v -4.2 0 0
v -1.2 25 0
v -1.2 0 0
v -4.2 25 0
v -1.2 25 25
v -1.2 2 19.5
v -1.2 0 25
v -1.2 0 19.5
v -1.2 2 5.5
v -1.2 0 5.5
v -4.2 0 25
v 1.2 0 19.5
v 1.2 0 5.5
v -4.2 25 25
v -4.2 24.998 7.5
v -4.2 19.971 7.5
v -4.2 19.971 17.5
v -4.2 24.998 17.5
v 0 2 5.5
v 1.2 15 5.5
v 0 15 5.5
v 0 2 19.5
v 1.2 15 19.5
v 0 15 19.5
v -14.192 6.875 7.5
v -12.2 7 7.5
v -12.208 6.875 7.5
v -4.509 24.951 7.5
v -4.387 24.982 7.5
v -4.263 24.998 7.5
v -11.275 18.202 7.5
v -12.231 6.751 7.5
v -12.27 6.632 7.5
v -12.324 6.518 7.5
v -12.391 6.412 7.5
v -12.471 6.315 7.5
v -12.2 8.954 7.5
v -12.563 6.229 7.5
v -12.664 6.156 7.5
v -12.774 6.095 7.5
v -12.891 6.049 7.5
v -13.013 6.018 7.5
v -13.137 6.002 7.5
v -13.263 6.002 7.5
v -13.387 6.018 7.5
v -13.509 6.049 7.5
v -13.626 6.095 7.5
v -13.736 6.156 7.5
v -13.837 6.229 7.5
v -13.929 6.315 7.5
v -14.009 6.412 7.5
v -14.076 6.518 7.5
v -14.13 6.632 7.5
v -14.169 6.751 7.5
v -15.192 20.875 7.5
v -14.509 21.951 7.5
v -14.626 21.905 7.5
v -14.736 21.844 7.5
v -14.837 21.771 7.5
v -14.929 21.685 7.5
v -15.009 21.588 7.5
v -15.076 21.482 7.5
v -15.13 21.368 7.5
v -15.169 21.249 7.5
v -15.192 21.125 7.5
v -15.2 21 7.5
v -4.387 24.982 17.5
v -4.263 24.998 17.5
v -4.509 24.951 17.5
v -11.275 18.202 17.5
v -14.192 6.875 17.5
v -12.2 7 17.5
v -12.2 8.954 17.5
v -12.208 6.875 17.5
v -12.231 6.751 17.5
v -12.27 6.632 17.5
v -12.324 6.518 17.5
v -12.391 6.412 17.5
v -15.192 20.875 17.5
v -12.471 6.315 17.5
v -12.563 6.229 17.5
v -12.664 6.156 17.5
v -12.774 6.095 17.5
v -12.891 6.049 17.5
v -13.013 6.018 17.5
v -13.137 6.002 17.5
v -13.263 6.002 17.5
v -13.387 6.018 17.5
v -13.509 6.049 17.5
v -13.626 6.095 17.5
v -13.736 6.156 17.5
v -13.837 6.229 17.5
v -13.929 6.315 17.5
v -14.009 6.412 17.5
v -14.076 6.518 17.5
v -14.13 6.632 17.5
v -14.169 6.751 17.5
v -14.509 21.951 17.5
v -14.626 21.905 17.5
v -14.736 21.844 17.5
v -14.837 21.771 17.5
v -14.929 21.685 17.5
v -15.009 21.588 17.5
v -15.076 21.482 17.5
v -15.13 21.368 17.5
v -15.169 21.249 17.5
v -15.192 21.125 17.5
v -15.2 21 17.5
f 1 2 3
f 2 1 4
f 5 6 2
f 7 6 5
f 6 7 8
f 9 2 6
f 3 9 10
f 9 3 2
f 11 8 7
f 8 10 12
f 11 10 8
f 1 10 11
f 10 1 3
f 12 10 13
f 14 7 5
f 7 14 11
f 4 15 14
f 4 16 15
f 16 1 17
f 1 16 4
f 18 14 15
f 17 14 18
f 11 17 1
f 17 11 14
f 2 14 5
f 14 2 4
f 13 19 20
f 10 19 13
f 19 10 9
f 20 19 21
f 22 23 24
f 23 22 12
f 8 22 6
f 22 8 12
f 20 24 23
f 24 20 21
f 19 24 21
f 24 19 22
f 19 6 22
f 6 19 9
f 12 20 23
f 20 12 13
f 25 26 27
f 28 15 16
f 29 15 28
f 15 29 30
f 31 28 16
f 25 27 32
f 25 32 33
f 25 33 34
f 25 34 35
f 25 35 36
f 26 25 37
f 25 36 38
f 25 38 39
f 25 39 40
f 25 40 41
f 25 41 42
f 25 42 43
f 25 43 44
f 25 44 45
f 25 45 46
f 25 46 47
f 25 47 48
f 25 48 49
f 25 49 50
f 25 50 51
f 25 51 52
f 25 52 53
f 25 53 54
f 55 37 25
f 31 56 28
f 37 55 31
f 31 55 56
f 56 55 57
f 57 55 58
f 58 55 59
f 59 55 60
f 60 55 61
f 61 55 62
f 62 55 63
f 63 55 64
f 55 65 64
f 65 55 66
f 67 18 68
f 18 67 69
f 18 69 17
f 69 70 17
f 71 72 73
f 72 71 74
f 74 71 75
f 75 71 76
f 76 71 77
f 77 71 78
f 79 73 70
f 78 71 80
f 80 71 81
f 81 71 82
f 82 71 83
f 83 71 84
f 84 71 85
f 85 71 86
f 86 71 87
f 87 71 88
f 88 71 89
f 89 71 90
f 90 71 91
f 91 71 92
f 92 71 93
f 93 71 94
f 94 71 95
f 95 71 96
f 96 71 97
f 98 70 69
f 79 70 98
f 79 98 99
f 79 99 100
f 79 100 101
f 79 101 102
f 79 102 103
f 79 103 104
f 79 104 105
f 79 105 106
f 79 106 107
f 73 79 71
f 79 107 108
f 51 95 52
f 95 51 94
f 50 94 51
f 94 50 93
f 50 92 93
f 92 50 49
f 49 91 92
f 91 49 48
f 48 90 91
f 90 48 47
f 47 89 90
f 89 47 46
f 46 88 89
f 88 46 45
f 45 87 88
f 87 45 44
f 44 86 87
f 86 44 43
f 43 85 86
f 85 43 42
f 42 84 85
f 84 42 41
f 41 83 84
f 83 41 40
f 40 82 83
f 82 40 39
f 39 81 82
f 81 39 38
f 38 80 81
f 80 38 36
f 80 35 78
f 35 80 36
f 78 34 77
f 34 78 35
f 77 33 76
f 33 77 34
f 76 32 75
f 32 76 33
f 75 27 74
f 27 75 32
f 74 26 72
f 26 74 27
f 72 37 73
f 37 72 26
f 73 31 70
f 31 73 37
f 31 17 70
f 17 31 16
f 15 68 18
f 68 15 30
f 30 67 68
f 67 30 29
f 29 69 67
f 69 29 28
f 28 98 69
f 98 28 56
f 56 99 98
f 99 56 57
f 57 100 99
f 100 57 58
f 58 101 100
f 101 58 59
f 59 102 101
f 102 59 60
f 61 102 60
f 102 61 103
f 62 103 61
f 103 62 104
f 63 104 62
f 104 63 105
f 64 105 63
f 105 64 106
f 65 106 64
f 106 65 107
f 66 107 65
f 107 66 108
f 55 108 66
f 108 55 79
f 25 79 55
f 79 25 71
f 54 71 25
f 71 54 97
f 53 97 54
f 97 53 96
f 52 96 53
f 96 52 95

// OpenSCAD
metal_thickness         = 1.2; //thickness of the sheet metal
slot_depth              = 1.2;
clip_length             = 15;
clip_width              = 14;
mountingplate_width     = 25;
mountingplate_thickness = 3;
mountingplate_height    = 25;
hook_width              = 10;
hook_type               = "single"; //"single" = ohne hook, "double" = two hooks in a row
round_edge_radius       = 1;
$fn                     = 50;
hook_data               = [[0,0],[10,3],[9,17],[9,15],[8,5],[0,3]];
custom_support          = false; //true = print a custom support structure for the clip. false = print no support.



//the mounting plate:
linear_extrude( mountingplate_width )
	translate([-metal_thickness-mountingplate_thickness,0,0])
		polygon( points=[[0,0],[0,mountingplate_height],[mountingplate_thickness,mountingplate_height],[mountingplate_thickness,0]] );


//the clip for the slot:
translate([0,0,(mountingplate_width-clip_width)/2])
	linear_extrude( clip_width )
		polygon( points=[[0,0],[0,clip_length],[slot_depth,clip_length],[slot_depth,0],[metal_thickness-mountingplate_thickness,0],[metal_thickness-mountingplate_thickness,2],[0,2]] );


//support structure for the clip (because cura does not handle the clip at all, and slic3r does not handle it to my complete satisfaction):
if ( custom_support )
{
	for(x = [0.5 : 1.0 : clip_length])
		translate([0.5,x,(mountingplate_width-clip_width)/2-2.8])
			rotate([90,0,0])
				linear_extrude( 0.5 )
					square([1.6,(mountingplate_width-clip_width)/2], center=true);
	translate([-0.8,1,(mountingplate_width-clip_width)/2-2.8])
		rotate([90,0,90])
			linear_extrude( 0.5 )
				square([2.5,(mountingplate_width-clip_width)/2], center=true);
}


//the hook:
if ( hook_type == "single" )
{
	translate([-metal_thickness-mountingplate_thickness,mountingplate_height-round_edge_radius,mountingplate_width/2-hook_width/2])
	rotate([180,180,0])
	linear_extrude(hook_width)
		minkowski()
		{
			//polygon( points=[[0,0],[8,3],[8,17],[5,15],[5,7],[0,5]] );
			polygon( points=hook_data );
			circle( r=round_edge_radius );
		}
}
else if ( hook_type == "double" )
{
	translate([-metal_thickness-mountingplate_thickness,mountingplate_height-round_edge_radius,0])
	rotate([180,180,0])
	linear_extrude(hook_width)
		minkowski()
		{
			polygon( points=hook_data );
			circle( r=round_edge_radius );
		}
	translate([-metal_thickness-mountingplate_thickness,mountingplate_height-round_edge_radius,mountingplate_width-hook_width])
	rotate([180,180,0])
	linear_extrude(hook_width)
		minkowski()
		{
			polygon( points=hook_data );
			circle( r=round_edge_radius );
		}
}
